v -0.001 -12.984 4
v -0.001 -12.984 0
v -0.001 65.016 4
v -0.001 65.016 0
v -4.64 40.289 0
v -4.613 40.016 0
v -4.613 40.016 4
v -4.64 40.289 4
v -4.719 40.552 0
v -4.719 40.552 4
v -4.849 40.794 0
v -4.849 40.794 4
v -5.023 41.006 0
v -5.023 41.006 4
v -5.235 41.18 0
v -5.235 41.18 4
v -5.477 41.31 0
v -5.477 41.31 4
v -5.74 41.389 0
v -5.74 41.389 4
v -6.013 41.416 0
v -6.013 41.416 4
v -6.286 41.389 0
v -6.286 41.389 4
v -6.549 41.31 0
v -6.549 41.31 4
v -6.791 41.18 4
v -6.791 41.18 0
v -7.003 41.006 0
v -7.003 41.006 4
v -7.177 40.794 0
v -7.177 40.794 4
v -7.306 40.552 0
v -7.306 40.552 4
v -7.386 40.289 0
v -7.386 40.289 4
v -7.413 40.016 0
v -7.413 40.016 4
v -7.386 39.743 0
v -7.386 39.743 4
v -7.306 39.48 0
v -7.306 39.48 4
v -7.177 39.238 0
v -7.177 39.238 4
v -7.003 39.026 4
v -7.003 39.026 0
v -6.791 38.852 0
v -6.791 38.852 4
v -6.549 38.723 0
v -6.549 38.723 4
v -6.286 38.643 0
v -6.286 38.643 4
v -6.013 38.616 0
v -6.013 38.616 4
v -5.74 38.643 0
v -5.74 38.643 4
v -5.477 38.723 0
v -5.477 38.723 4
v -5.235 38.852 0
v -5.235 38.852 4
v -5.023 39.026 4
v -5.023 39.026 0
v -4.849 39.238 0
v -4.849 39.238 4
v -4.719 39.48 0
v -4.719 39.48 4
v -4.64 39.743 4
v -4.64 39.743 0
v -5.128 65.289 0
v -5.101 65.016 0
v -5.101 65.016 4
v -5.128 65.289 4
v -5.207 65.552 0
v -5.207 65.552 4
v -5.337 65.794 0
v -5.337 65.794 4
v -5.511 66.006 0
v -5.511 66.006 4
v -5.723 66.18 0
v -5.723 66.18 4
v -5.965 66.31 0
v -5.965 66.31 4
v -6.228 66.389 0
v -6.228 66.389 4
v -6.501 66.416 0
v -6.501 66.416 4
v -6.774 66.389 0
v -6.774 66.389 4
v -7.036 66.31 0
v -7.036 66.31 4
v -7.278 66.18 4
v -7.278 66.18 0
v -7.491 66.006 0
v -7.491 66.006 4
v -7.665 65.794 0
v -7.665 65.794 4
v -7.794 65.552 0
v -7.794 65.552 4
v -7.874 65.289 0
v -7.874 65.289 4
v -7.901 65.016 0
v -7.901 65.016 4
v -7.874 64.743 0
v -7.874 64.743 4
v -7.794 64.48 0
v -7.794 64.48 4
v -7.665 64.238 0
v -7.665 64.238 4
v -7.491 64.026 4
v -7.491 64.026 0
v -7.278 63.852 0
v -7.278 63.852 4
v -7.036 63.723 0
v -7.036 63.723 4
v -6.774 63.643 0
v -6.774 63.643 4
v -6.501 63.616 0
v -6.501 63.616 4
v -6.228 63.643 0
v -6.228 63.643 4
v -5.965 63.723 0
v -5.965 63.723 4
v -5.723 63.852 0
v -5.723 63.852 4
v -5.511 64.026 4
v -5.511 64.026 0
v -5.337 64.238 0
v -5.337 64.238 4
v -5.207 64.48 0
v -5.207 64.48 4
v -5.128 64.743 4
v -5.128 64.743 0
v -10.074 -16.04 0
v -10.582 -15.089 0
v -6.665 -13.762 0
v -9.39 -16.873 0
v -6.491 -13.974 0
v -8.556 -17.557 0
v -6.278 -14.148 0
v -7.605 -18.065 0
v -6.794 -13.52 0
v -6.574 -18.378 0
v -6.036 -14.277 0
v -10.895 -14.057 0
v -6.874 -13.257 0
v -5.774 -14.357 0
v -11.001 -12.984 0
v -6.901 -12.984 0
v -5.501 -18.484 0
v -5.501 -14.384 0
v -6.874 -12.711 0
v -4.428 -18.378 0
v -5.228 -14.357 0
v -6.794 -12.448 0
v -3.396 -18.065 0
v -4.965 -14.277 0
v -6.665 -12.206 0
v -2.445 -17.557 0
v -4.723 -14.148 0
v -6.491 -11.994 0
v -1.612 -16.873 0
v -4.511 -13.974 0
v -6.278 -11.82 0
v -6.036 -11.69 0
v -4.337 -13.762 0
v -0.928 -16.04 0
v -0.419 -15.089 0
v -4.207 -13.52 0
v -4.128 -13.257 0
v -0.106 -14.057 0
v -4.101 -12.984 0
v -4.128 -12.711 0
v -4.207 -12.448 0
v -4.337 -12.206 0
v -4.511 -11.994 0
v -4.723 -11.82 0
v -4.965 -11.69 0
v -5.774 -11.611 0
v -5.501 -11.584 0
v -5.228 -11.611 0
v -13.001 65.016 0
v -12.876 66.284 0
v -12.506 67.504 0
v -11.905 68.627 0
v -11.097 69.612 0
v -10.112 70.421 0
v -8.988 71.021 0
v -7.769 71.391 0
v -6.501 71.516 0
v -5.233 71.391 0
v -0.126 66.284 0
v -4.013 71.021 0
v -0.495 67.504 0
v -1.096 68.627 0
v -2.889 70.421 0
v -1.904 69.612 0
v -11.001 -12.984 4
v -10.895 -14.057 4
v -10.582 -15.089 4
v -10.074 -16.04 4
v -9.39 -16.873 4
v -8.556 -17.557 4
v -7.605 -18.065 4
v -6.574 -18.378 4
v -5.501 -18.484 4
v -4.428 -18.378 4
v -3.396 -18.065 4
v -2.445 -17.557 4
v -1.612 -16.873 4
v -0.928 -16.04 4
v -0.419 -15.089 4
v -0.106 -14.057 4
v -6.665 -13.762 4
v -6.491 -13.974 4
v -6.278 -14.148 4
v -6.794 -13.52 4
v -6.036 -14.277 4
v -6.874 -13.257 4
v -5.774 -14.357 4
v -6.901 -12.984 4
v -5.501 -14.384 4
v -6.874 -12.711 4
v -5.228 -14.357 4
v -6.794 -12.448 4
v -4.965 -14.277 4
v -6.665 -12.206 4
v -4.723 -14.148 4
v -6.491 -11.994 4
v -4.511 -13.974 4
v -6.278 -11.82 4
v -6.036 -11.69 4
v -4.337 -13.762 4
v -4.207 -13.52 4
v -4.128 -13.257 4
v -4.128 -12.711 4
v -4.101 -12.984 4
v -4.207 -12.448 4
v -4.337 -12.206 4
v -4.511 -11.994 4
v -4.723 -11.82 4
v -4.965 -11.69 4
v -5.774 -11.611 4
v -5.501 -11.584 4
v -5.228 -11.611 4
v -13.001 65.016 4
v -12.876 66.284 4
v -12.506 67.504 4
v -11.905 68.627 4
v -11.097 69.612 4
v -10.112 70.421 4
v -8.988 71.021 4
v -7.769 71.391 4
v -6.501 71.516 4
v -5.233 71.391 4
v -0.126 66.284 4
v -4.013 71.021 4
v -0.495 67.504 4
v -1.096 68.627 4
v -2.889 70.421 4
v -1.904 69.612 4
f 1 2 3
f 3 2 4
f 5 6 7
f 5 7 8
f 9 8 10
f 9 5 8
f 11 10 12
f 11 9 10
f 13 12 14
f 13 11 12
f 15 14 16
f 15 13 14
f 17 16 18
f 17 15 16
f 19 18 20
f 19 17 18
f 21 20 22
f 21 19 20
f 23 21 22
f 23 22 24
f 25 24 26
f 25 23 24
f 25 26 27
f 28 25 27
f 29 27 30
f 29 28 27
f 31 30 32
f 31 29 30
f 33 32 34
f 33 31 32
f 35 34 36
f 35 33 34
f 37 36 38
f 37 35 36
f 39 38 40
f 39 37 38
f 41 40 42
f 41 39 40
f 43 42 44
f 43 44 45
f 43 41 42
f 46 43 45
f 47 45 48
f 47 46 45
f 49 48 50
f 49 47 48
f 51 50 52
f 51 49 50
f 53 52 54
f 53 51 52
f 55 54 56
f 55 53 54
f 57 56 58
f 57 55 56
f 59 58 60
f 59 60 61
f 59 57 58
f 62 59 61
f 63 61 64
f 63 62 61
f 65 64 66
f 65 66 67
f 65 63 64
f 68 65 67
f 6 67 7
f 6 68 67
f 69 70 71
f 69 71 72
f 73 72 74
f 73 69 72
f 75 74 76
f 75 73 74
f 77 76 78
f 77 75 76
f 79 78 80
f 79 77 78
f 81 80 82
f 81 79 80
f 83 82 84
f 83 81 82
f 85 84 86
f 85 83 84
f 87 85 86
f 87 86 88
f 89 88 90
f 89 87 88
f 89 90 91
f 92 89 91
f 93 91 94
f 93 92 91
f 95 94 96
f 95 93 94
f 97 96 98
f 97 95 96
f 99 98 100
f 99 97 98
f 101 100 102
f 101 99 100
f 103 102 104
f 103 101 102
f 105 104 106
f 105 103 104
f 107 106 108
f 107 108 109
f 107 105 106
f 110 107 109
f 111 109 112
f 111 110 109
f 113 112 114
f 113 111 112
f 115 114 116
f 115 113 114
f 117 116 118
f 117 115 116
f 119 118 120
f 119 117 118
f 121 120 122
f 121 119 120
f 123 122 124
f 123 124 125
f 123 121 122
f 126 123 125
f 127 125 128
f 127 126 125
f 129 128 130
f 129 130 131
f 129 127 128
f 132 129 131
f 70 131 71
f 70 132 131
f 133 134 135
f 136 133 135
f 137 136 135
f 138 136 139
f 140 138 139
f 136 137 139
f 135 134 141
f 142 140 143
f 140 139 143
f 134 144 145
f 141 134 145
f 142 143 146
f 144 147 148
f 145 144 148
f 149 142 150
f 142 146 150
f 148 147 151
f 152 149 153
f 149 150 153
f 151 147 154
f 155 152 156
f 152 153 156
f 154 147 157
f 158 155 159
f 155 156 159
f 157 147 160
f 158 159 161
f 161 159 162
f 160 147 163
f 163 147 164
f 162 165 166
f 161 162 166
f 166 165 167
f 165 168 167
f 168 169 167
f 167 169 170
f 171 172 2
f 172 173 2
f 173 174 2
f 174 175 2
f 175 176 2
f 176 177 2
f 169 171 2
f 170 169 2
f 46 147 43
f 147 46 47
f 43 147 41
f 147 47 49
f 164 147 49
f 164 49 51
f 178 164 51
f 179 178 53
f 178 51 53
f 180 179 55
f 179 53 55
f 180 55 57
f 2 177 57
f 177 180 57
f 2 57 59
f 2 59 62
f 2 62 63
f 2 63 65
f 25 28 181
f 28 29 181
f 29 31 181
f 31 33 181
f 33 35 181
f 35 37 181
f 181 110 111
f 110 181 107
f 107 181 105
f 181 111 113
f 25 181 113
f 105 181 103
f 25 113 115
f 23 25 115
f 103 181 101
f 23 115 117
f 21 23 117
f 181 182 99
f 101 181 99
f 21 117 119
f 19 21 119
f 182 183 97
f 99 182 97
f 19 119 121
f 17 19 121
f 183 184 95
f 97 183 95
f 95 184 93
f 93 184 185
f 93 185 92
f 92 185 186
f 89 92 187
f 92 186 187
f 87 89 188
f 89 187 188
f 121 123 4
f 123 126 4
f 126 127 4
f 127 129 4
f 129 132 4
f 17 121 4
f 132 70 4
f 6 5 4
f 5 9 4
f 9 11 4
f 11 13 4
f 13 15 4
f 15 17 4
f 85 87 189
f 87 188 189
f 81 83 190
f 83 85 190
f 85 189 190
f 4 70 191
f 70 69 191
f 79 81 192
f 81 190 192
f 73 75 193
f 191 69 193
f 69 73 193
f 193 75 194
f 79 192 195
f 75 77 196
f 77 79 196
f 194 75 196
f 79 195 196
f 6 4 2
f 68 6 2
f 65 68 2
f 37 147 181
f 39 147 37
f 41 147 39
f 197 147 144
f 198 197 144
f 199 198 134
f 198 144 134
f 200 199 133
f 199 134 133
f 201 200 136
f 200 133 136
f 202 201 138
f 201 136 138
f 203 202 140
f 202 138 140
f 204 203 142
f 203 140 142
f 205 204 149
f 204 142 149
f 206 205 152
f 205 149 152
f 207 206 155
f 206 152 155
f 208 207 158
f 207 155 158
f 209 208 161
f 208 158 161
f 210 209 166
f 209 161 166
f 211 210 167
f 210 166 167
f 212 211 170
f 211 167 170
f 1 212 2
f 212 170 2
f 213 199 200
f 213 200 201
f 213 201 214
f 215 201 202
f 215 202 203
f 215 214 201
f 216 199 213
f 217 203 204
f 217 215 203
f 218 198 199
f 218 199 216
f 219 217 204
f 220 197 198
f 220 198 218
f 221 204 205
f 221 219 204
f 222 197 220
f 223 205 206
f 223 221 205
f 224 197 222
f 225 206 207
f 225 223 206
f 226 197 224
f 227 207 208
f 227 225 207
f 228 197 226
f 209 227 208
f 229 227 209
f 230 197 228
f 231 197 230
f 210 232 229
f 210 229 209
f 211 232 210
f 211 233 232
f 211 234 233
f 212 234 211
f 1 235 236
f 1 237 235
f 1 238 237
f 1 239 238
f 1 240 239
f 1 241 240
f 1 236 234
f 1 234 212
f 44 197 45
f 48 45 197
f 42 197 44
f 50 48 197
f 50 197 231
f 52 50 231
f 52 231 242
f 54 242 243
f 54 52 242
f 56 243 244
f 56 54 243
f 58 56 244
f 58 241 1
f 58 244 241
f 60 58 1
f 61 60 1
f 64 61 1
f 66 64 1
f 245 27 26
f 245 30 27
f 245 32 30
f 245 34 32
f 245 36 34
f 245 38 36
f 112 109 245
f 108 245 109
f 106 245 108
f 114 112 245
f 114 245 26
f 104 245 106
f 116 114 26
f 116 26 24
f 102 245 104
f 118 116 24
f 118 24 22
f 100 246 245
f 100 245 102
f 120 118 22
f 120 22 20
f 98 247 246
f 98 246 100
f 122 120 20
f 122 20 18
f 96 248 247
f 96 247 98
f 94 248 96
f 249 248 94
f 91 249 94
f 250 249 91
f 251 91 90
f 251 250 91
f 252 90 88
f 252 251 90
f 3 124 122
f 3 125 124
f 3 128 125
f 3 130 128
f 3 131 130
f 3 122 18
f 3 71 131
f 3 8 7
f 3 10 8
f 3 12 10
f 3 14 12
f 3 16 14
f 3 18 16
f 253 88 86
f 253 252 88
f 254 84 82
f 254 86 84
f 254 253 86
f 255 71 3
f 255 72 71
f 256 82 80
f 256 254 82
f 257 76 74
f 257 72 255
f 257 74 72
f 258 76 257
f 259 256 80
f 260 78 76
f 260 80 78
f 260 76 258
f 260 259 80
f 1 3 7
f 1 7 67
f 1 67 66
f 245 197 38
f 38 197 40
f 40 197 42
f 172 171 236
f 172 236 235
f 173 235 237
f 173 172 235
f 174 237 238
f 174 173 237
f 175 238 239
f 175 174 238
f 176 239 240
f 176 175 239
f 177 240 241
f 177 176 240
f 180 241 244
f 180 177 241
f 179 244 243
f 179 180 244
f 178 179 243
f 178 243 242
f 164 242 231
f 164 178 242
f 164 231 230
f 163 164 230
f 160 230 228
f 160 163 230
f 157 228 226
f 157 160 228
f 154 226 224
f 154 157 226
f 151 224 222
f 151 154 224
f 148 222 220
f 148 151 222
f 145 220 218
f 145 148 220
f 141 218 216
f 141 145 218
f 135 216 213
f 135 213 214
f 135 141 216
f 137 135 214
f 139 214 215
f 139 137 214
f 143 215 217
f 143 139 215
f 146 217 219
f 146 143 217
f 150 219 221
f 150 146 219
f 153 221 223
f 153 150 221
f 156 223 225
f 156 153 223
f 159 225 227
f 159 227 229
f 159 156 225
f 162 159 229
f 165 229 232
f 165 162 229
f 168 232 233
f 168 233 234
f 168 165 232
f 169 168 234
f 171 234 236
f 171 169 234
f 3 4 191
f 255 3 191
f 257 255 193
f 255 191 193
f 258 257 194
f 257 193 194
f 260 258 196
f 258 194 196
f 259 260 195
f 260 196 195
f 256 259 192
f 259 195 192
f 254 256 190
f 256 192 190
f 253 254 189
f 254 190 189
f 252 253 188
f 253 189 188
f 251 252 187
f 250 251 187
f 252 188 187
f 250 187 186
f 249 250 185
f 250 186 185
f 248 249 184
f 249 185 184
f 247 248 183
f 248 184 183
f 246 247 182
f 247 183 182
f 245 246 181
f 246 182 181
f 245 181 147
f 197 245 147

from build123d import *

# Parameters (mm, degrees)
SKETCH1_R           = 1.4
BOSS_EXTRUDE2_DEPTH = 4


with BuildPart() as part:
    # Sketch1 → Boss-Extrude2 (new body)
    with BuildSketch(Plane.XY):
        with BuildLine():
            Line((-0.000688459, -12.983908279), (-0.000688459, 65.016091721))
            ThreePointArc((-0.000688459, 65.016091721), (-6.500688459, 71.516091721), (-13.000688459, 65.016091721))
            Line((-13.000688459, 65.016091721), (-11.000688459, -12.983908279))
            ThreePointArc((-11.000688459, -12.983908279), (-5.500688459, -18.483908279), (-0.000688459, -12.983908279))
        make_face()
        with Locations((-6.500688459, 65.016091721)):
            Circle(SKETCH1_R, mode=Mode.SUBTRACT)
        with Locations((-5.500688459, -12.983908279)):
            Circle(SKETCH1_R, mode=Mode.SUBTRACT)
        with Locations((-6.012756351, 40.016091721)):
            Circle(SKETCH1_R, mode=Mode.SUBTRACT)
    extrude(amount=BOSS_EXTRUDE2_DEPTH)


solid = part.part
